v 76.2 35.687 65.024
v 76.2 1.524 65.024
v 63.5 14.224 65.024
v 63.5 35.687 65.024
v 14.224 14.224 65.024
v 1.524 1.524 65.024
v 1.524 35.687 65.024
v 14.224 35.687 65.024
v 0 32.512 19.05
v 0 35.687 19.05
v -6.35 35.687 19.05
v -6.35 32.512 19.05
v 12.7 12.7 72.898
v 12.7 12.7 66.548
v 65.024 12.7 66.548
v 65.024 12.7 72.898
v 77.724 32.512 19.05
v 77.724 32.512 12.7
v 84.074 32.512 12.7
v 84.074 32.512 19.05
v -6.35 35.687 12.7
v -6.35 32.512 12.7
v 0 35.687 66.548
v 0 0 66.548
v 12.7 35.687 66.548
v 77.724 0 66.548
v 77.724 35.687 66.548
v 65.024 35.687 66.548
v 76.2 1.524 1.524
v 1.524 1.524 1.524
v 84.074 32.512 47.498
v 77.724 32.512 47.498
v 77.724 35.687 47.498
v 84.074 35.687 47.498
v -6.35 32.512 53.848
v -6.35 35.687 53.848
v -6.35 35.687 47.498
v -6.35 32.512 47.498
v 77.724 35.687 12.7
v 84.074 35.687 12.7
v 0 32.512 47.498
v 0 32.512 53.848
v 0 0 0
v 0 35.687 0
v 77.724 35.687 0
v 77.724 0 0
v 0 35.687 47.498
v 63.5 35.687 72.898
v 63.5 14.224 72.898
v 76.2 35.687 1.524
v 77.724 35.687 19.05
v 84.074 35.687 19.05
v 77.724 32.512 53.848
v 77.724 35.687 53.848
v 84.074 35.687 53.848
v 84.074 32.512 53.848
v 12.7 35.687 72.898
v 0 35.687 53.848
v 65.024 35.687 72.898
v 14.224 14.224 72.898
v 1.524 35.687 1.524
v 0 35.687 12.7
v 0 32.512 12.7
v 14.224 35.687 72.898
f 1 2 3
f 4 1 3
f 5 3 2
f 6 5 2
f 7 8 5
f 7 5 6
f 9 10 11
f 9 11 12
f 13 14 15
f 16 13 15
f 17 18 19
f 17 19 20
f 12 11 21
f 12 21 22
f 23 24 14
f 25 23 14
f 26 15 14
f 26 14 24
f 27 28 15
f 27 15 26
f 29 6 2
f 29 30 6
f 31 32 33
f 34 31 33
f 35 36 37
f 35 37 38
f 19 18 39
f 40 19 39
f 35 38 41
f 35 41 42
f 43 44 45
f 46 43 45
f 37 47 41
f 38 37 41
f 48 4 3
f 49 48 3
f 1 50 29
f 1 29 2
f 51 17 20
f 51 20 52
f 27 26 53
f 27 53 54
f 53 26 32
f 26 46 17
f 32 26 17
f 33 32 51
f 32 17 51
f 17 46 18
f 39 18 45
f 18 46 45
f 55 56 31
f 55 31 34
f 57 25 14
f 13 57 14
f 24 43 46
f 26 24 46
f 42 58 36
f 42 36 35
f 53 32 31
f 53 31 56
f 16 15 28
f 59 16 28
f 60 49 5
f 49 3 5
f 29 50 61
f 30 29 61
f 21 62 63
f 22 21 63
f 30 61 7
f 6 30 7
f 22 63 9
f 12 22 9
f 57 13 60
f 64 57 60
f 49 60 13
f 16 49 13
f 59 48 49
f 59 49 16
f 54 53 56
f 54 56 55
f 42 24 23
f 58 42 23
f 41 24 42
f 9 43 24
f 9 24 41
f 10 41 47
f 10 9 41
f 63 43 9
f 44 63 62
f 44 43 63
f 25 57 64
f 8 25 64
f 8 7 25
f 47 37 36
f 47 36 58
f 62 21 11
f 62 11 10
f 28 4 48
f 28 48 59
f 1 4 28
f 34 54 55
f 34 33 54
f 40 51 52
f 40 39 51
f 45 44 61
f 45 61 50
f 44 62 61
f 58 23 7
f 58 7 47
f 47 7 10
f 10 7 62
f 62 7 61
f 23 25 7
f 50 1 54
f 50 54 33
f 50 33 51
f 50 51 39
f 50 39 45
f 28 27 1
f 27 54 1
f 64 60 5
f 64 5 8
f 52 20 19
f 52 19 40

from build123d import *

# Parameters (mm, degrees)
F0_W      = 77.724
F0_H      = 35.687
F1_DEPTH  = 66.548
F2_T      = -1.524
F4_DEPTH  = 6.35
F5_DEPTH  = 25.4
F6_W      = 3.175
F6_H      = 6.35
F7_DEPTH  = 6.35
F8_W      = 3.175
F8_H      = 6.35
F9_DEPTH  = 6.35
F10_W     = 74.676
F10_H     = 63.5
F11_DEPTH = 1.524


with BuildPart() as f1:
    # F0 (on Top) → F1 (new body)
    with BuildSketch(Plane.XY):
        with Locations((38.862, 17.8435)):
            Rectangle(F0_W, F0_H)
    extrude(amount=F1_DEPTH)

    # F2 (hollow: no face is removed)
    offset(amount=F2_T, mode=Mode.SUBTRACT)

    # F3 (on face) → F4 (join)
    with BuildSketch(Plane.XY.offset(66.548)):
        Polygon((63.5, 14.224), (14.224, 14.224), (14.224, 35.687), (12.7, 35.687), (12.7, 12.7), (65.024, 12.7), (65.024, 35.687), (63.5, 35.687), align=None)
    extrude(amount=F4_DEPTH)

    # F5 (cut): a face of the model
    f5_faces = [f1.faces().sort_by_distance(p)[0] for p in [
        (38.862, 24.9555, 66.548),
    ]]
    extrude(f5_faces, amount=-F5_DEPTH, mode=Mode.SUBTRACT)

    # F6 (on face) → F7 (join)
    with BuildSketch(Plane.YZ.offset(77.724)):
        with Locations((34.0995, 15.875)):
            Rectangle(F6_W, F6_H)
        with Locations((34.0995, 50.673)):
            Rectangle(F6_W, F6_H)
    extrude(amount=F7_DEPTH)

    # F8 (on face) → F9 (join)
    with BuildSketch(Plane(origin=(0, 0, 0), x_dir=(0, -1, 0), z_dir=(-1, 0, 0))):
        with Locations((-34.0995, 15.875)):
            Rectangle(F8_W, F8_H)
        with Locations((-34.0995, 50.673)):
            Rectangle(F8_W, F8_H)
    extrude(amount=F9_DEPTH)

    # F10 (on face) → F11 (cut)
    with BuildSketch(Plane(origin=(0, 35.687, 0), x_dir=(-1, 0, 0), z_dir=(0, 1, 0))):
        with Locations((-38.862, 33.274)):
            Rectangle(F10_W, F10_H)
    extrude(amount=-F11_DEPTH, mode=Mode.SUBTRACT)


solid = f1.part
